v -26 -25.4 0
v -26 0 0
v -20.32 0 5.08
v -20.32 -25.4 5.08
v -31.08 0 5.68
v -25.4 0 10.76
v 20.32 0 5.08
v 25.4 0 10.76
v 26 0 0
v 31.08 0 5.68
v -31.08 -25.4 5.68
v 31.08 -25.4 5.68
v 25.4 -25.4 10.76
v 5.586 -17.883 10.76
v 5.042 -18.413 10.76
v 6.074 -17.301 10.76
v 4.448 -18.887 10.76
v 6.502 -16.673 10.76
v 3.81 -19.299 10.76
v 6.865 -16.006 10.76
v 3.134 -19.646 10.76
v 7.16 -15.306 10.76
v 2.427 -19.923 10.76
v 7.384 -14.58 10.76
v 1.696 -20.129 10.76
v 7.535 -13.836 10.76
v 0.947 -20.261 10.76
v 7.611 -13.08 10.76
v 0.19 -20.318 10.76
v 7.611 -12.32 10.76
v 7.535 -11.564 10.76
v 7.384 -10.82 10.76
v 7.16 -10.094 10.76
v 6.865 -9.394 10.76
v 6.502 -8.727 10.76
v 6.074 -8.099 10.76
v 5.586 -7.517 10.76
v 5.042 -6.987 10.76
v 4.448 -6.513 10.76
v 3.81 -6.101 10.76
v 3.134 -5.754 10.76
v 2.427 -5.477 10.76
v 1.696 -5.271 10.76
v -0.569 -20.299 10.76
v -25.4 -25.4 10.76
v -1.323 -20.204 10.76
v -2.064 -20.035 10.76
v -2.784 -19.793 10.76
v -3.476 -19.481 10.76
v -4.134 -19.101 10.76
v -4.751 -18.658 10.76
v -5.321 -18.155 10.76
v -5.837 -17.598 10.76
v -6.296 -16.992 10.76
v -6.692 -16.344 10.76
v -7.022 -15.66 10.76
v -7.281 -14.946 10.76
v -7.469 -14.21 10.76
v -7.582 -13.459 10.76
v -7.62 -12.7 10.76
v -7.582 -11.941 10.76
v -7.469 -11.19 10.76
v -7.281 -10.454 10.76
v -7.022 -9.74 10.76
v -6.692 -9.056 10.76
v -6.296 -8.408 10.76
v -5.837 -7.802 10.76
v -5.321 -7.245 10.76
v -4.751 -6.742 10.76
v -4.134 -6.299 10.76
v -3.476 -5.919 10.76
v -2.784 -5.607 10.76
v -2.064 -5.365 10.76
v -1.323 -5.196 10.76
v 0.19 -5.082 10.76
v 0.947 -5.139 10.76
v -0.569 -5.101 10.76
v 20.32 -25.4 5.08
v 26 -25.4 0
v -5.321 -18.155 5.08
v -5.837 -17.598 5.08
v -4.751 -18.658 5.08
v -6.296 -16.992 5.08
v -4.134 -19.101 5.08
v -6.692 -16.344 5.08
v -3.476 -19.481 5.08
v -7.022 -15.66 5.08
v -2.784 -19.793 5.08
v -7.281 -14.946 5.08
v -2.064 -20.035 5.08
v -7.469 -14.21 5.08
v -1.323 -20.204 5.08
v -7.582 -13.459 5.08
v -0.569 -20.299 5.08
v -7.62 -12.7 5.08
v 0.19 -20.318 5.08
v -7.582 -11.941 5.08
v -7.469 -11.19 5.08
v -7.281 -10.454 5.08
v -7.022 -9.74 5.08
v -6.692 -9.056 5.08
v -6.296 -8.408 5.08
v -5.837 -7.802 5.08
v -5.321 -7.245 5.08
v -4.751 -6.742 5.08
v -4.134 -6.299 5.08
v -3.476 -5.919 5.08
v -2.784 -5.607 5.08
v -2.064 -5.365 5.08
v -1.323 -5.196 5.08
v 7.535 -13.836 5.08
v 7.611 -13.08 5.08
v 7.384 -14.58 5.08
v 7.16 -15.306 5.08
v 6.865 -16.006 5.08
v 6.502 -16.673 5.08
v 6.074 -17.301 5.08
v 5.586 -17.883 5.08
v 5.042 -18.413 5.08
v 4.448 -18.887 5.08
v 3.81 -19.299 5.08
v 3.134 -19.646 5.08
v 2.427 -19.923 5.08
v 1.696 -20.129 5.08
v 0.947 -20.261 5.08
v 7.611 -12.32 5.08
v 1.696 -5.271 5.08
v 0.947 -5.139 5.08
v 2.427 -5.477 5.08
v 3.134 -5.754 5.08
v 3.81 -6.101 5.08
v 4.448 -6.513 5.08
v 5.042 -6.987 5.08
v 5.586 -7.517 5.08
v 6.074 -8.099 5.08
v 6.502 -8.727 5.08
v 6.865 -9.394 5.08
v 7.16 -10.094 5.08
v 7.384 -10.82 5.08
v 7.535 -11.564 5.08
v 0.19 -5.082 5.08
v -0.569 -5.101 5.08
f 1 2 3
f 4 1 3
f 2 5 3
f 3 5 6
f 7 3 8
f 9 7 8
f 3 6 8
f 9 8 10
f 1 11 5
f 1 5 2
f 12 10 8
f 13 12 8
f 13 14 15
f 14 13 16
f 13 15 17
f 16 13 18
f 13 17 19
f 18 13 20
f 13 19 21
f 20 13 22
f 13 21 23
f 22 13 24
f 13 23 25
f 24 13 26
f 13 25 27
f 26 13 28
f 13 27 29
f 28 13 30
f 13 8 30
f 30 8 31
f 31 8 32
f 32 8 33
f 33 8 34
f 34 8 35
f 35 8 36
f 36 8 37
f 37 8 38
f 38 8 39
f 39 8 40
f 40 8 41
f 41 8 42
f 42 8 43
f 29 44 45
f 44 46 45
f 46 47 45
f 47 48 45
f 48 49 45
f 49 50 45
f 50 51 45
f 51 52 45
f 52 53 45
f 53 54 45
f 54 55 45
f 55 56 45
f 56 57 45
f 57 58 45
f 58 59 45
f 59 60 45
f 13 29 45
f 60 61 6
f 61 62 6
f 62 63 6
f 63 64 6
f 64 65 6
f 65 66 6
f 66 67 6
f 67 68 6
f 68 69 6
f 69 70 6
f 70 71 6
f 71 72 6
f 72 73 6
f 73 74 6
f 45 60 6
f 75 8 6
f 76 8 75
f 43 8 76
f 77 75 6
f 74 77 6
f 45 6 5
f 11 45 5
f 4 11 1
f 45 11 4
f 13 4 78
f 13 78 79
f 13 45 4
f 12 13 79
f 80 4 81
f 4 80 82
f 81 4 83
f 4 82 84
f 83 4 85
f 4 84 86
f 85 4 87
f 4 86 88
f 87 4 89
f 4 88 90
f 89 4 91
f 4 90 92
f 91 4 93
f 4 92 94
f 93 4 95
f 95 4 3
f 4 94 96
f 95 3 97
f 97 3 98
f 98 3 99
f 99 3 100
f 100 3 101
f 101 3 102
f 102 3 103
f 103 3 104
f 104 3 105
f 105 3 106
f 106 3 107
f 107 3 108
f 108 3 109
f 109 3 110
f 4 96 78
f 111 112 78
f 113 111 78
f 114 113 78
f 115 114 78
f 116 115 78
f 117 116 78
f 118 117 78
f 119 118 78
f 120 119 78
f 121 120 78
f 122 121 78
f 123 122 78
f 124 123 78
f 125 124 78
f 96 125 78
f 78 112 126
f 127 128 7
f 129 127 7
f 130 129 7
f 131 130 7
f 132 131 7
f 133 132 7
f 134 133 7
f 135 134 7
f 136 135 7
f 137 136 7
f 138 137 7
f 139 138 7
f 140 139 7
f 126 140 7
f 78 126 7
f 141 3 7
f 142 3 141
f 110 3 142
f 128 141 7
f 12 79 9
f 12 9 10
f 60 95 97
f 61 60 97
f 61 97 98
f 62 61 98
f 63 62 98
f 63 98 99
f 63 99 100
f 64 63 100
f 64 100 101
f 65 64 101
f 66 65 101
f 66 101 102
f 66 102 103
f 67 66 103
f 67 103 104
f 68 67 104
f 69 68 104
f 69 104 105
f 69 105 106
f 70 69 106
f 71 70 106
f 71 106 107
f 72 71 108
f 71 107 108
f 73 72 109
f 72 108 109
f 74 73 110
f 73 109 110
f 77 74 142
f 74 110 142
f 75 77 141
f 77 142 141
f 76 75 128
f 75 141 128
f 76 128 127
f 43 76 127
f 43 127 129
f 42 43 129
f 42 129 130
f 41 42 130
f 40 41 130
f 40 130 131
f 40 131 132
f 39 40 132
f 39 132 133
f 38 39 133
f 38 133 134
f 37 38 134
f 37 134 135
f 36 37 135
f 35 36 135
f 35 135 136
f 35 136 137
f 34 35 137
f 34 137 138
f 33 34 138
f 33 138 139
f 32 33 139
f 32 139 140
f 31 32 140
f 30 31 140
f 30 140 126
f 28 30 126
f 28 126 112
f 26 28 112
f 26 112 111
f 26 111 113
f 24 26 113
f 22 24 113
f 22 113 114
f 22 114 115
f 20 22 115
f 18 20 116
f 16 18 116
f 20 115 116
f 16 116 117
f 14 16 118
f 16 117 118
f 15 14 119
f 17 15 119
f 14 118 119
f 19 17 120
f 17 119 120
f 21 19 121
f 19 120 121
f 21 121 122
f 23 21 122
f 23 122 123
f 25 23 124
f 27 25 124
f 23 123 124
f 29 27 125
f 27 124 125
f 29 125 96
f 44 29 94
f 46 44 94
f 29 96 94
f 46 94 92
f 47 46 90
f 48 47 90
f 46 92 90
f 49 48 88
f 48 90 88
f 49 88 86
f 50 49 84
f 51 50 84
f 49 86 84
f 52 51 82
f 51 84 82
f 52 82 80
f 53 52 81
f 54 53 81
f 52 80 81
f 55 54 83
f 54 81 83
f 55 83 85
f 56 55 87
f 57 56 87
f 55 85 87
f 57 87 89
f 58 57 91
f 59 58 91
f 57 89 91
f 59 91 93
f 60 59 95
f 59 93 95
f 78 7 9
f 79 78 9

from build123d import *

# Parameters (mm, degrees)
F1_DEPTH = 25.4
F3_D     = 15.24


with BuildPart() as f1:
    # F0 (on Front) → F1 (new body)
    with BuildSketch(Plane.XZ):
        Polygon((-31.079613, 5.679613), (-25.999613, 0), (-20.32, 5.08), (0, 5.08), (20.32, 5.08), (25.999613, 0), (31.079613, 5.679613), (25.4, 10.759613), (0, 10.759613), (-25.4, 10.759613), align=None)
    extrude(amount=F1_DEPTH)

    # F3 (through all)
    with Locations(Plane.XY.offset(10.759613)):
        with Locations((0, -12.7)):
            Hole(F3_D / 2)


solid = f1.part
